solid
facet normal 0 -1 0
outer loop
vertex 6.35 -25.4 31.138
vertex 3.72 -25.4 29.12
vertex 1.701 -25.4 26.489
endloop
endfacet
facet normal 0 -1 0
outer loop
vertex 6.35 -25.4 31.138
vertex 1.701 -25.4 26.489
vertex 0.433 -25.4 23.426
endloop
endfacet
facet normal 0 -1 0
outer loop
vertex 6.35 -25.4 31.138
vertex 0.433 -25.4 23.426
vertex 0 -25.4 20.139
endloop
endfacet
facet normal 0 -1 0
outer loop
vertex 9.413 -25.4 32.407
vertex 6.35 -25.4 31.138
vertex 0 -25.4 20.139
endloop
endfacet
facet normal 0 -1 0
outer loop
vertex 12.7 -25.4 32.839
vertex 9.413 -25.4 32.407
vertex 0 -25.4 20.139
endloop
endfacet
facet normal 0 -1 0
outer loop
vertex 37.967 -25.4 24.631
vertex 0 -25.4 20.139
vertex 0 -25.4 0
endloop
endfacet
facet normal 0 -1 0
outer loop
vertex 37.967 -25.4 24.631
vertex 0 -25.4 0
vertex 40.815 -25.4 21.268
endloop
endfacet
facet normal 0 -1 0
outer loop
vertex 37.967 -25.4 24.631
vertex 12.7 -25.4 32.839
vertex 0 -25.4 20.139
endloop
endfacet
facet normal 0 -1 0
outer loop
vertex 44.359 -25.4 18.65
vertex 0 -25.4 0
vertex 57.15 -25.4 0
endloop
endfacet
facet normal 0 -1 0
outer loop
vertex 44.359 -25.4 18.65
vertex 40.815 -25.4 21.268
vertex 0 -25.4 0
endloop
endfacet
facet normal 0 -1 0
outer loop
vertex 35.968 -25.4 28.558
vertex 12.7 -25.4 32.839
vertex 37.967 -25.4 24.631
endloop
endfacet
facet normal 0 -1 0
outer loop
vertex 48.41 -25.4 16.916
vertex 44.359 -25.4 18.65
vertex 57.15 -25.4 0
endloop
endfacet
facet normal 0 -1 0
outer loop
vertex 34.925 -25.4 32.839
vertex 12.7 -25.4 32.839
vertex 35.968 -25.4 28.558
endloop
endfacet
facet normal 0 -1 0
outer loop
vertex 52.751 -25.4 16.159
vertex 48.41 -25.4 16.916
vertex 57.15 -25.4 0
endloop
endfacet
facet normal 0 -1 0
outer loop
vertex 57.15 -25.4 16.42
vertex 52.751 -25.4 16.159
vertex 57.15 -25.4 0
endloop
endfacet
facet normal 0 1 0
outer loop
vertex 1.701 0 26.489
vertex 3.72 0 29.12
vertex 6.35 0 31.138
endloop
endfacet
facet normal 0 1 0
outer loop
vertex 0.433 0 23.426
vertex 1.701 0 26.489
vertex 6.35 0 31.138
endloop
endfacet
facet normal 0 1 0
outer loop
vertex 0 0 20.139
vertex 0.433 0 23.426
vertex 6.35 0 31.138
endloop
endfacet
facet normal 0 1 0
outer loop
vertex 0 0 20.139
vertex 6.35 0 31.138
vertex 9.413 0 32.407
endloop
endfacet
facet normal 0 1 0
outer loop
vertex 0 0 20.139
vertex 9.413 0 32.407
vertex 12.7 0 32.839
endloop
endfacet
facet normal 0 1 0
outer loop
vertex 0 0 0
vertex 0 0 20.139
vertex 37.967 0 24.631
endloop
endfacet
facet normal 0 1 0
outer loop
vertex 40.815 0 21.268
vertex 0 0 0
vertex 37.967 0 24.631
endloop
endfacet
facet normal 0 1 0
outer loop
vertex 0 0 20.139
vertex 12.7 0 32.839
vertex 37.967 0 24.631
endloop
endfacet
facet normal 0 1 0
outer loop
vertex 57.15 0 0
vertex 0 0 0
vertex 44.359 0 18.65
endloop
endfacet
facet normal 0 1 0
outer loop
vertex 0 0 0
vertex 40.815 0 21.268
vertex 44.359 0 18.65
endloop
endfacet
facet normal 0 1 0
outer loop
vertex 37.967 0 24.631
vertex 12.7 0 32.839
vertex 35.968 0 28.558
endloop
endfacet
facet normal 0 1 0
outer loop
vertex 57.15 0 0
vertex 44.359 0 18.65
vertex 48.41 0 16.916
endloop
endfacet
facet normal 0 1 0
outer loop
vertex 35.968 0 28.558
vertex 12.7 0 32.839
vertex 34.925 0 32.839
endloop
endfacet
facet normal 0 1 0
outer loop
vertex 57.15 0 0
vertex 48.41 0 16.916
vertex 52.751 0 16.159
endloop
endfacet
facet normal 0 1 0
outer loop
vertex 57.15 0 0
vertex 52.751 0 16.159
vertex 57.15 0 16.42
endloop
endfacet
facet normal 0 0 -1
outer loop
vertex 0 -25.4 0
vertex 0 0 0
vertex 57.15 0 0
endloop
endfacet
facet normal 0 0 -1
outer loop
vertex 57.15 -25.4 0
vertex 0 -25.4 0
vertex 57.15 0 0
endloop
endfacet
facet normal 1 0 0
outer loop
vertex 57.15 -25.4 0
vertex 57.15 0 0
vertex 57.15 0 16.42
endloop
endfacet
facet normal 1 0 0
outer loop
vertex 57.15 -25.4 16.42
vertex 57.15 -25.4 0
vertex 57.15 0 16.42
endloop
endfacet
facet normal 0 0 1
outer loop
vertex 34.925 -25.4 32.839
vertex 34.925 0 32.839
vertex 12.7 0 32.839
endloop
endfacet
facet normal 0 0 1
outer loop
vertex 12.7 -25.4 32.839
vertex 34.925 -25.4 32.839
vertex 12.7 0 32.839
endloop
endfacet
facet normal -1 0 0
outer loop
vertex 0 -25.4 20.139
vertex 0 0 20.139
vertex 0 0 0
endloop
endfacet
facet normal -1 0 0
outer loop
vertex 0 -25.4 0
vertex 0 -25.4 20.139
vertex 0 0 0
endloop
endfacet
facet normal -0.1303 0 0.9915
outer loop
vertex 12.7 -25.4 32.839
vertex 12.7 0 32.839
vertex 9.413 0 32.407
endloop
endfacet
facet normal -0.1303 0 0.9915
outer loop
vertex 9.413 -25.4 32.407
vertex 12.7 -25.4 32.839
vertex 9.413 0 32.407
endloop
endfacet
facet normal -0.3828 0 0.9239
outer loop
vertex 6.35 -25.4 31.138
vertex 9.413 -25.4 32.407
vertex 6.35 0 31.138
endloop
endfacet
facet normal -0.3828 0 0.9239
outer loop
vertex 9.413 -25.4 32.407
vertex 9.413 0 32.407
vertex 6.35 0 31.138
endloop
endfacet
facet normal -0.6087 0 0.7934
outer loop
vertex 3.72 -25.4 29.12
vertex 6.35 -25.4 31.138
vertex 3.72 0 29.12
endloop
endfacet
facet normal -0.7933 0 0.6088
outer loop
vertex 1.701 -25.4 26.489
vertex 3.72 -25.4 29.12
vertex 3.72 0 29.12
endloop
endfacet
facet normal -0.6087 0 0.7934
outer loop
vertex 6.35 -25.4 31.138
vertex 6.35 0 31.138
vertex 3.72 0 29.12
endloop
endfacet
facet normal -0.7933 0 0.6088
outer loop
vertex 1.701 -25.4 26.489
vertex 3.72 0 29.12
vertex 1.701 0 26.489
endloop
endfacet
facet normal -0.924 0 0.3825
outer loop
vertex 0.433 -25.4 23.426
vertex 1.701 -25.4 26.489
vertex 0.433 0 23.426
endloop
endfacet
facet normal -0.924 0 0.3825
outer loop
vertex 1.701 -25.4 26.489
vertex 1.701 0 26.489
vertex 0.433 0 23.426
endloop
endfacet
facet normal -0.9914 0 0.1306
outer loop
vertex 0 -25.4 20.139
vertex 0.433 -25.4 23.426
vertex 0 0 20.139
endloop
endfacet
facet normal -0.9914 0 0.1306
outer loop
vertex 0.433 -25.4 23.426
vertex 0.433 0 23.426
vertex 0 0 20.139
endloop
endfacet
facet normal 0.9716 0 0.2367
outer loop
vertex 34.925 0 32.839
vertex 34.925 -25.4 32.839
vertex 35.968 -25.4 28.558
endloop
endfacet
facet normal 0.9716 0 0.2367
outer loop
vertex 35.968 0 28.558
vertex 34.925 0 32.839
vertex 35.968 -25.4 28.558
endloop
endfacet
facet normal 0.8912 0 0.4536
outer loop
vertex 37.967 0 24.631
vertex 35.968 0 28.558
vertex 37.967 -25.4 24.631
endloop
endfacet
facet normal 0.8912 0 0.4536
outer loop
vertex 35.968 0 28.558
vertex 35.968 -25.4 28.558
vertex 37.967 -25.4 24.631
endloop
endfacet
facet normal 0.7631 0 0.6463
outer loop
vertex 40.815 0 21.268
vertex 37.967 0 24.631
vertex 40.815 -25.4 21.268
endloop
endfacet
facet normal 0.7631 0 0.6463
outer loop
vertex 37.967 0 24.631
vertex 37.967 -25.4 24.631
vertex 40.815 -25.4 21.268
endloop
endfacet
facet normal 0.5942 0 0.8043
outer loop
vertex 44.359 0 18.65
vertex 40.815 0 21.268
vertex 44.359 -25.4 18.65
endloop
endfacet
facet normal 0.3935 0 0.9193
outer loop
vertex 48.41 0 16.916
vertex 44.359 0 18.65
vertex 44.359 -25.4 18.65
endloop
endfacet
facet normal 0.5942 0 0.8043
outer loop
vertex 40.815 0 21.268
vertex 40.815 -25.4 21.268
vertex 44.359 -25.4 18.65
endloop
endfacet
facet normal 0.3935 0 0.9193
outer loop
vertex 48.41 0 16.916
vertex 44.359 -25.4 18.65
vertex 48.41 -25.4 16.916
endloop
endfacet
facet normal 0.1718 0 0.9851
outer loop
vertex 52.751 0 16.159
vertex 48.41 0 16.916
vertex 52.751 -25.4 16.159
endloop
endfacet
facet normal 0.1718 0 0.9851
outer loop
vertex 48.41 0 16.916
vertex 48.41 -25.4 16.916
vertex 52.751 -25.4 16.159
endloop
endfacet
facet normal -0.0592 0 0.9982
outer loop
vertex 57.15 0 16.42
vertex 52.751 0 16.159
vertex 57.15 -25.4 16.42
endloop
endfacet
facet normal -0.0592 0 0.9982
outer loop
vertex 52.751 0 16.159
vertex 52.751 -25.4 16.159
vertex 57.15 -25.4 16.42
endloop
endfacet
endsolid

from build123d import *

# Parameters (mm, degrees)
F1_DEPTH = 25.4
F3_DEPTH = 25.4


with BuildPart() as f1:
    # F0 (on Front) → F1 (new body)
    with BuildSketch(Plane.XZ):
        with BuildLine():
            Line((0, 20.139488), (0, 0))
            Line((0, 0), (57.15, 0))
            Line((57.15, 0), (57.15, 32.839488))
            Line((57.15, 32.839488), (12.7, 32.839488))
            ThreePointArc((12.7, 32.839488), (3.719744, 29.119744), (0, 20.139488))
        make_face()
    extrude(amount=F1_DEPTH)

    # F2 (on face) → F3 (cut)
    with BuildSketch(Plane.XZ.offset(25.4)):
        with BuildLine():
            Line((57.15, 32.839488), (34.925, 32.839488))
            ThreePointArc((34.925, 32.839488), (42.511039, 19.856363), (57.15, 16.419744))
            Line((57.15, 16.419744), (57.15, 32.839488))
        make_face()
    extrude(amount=-F3_DEPTH, mode=Mode.SUBTRACT)


solid = f1.part
